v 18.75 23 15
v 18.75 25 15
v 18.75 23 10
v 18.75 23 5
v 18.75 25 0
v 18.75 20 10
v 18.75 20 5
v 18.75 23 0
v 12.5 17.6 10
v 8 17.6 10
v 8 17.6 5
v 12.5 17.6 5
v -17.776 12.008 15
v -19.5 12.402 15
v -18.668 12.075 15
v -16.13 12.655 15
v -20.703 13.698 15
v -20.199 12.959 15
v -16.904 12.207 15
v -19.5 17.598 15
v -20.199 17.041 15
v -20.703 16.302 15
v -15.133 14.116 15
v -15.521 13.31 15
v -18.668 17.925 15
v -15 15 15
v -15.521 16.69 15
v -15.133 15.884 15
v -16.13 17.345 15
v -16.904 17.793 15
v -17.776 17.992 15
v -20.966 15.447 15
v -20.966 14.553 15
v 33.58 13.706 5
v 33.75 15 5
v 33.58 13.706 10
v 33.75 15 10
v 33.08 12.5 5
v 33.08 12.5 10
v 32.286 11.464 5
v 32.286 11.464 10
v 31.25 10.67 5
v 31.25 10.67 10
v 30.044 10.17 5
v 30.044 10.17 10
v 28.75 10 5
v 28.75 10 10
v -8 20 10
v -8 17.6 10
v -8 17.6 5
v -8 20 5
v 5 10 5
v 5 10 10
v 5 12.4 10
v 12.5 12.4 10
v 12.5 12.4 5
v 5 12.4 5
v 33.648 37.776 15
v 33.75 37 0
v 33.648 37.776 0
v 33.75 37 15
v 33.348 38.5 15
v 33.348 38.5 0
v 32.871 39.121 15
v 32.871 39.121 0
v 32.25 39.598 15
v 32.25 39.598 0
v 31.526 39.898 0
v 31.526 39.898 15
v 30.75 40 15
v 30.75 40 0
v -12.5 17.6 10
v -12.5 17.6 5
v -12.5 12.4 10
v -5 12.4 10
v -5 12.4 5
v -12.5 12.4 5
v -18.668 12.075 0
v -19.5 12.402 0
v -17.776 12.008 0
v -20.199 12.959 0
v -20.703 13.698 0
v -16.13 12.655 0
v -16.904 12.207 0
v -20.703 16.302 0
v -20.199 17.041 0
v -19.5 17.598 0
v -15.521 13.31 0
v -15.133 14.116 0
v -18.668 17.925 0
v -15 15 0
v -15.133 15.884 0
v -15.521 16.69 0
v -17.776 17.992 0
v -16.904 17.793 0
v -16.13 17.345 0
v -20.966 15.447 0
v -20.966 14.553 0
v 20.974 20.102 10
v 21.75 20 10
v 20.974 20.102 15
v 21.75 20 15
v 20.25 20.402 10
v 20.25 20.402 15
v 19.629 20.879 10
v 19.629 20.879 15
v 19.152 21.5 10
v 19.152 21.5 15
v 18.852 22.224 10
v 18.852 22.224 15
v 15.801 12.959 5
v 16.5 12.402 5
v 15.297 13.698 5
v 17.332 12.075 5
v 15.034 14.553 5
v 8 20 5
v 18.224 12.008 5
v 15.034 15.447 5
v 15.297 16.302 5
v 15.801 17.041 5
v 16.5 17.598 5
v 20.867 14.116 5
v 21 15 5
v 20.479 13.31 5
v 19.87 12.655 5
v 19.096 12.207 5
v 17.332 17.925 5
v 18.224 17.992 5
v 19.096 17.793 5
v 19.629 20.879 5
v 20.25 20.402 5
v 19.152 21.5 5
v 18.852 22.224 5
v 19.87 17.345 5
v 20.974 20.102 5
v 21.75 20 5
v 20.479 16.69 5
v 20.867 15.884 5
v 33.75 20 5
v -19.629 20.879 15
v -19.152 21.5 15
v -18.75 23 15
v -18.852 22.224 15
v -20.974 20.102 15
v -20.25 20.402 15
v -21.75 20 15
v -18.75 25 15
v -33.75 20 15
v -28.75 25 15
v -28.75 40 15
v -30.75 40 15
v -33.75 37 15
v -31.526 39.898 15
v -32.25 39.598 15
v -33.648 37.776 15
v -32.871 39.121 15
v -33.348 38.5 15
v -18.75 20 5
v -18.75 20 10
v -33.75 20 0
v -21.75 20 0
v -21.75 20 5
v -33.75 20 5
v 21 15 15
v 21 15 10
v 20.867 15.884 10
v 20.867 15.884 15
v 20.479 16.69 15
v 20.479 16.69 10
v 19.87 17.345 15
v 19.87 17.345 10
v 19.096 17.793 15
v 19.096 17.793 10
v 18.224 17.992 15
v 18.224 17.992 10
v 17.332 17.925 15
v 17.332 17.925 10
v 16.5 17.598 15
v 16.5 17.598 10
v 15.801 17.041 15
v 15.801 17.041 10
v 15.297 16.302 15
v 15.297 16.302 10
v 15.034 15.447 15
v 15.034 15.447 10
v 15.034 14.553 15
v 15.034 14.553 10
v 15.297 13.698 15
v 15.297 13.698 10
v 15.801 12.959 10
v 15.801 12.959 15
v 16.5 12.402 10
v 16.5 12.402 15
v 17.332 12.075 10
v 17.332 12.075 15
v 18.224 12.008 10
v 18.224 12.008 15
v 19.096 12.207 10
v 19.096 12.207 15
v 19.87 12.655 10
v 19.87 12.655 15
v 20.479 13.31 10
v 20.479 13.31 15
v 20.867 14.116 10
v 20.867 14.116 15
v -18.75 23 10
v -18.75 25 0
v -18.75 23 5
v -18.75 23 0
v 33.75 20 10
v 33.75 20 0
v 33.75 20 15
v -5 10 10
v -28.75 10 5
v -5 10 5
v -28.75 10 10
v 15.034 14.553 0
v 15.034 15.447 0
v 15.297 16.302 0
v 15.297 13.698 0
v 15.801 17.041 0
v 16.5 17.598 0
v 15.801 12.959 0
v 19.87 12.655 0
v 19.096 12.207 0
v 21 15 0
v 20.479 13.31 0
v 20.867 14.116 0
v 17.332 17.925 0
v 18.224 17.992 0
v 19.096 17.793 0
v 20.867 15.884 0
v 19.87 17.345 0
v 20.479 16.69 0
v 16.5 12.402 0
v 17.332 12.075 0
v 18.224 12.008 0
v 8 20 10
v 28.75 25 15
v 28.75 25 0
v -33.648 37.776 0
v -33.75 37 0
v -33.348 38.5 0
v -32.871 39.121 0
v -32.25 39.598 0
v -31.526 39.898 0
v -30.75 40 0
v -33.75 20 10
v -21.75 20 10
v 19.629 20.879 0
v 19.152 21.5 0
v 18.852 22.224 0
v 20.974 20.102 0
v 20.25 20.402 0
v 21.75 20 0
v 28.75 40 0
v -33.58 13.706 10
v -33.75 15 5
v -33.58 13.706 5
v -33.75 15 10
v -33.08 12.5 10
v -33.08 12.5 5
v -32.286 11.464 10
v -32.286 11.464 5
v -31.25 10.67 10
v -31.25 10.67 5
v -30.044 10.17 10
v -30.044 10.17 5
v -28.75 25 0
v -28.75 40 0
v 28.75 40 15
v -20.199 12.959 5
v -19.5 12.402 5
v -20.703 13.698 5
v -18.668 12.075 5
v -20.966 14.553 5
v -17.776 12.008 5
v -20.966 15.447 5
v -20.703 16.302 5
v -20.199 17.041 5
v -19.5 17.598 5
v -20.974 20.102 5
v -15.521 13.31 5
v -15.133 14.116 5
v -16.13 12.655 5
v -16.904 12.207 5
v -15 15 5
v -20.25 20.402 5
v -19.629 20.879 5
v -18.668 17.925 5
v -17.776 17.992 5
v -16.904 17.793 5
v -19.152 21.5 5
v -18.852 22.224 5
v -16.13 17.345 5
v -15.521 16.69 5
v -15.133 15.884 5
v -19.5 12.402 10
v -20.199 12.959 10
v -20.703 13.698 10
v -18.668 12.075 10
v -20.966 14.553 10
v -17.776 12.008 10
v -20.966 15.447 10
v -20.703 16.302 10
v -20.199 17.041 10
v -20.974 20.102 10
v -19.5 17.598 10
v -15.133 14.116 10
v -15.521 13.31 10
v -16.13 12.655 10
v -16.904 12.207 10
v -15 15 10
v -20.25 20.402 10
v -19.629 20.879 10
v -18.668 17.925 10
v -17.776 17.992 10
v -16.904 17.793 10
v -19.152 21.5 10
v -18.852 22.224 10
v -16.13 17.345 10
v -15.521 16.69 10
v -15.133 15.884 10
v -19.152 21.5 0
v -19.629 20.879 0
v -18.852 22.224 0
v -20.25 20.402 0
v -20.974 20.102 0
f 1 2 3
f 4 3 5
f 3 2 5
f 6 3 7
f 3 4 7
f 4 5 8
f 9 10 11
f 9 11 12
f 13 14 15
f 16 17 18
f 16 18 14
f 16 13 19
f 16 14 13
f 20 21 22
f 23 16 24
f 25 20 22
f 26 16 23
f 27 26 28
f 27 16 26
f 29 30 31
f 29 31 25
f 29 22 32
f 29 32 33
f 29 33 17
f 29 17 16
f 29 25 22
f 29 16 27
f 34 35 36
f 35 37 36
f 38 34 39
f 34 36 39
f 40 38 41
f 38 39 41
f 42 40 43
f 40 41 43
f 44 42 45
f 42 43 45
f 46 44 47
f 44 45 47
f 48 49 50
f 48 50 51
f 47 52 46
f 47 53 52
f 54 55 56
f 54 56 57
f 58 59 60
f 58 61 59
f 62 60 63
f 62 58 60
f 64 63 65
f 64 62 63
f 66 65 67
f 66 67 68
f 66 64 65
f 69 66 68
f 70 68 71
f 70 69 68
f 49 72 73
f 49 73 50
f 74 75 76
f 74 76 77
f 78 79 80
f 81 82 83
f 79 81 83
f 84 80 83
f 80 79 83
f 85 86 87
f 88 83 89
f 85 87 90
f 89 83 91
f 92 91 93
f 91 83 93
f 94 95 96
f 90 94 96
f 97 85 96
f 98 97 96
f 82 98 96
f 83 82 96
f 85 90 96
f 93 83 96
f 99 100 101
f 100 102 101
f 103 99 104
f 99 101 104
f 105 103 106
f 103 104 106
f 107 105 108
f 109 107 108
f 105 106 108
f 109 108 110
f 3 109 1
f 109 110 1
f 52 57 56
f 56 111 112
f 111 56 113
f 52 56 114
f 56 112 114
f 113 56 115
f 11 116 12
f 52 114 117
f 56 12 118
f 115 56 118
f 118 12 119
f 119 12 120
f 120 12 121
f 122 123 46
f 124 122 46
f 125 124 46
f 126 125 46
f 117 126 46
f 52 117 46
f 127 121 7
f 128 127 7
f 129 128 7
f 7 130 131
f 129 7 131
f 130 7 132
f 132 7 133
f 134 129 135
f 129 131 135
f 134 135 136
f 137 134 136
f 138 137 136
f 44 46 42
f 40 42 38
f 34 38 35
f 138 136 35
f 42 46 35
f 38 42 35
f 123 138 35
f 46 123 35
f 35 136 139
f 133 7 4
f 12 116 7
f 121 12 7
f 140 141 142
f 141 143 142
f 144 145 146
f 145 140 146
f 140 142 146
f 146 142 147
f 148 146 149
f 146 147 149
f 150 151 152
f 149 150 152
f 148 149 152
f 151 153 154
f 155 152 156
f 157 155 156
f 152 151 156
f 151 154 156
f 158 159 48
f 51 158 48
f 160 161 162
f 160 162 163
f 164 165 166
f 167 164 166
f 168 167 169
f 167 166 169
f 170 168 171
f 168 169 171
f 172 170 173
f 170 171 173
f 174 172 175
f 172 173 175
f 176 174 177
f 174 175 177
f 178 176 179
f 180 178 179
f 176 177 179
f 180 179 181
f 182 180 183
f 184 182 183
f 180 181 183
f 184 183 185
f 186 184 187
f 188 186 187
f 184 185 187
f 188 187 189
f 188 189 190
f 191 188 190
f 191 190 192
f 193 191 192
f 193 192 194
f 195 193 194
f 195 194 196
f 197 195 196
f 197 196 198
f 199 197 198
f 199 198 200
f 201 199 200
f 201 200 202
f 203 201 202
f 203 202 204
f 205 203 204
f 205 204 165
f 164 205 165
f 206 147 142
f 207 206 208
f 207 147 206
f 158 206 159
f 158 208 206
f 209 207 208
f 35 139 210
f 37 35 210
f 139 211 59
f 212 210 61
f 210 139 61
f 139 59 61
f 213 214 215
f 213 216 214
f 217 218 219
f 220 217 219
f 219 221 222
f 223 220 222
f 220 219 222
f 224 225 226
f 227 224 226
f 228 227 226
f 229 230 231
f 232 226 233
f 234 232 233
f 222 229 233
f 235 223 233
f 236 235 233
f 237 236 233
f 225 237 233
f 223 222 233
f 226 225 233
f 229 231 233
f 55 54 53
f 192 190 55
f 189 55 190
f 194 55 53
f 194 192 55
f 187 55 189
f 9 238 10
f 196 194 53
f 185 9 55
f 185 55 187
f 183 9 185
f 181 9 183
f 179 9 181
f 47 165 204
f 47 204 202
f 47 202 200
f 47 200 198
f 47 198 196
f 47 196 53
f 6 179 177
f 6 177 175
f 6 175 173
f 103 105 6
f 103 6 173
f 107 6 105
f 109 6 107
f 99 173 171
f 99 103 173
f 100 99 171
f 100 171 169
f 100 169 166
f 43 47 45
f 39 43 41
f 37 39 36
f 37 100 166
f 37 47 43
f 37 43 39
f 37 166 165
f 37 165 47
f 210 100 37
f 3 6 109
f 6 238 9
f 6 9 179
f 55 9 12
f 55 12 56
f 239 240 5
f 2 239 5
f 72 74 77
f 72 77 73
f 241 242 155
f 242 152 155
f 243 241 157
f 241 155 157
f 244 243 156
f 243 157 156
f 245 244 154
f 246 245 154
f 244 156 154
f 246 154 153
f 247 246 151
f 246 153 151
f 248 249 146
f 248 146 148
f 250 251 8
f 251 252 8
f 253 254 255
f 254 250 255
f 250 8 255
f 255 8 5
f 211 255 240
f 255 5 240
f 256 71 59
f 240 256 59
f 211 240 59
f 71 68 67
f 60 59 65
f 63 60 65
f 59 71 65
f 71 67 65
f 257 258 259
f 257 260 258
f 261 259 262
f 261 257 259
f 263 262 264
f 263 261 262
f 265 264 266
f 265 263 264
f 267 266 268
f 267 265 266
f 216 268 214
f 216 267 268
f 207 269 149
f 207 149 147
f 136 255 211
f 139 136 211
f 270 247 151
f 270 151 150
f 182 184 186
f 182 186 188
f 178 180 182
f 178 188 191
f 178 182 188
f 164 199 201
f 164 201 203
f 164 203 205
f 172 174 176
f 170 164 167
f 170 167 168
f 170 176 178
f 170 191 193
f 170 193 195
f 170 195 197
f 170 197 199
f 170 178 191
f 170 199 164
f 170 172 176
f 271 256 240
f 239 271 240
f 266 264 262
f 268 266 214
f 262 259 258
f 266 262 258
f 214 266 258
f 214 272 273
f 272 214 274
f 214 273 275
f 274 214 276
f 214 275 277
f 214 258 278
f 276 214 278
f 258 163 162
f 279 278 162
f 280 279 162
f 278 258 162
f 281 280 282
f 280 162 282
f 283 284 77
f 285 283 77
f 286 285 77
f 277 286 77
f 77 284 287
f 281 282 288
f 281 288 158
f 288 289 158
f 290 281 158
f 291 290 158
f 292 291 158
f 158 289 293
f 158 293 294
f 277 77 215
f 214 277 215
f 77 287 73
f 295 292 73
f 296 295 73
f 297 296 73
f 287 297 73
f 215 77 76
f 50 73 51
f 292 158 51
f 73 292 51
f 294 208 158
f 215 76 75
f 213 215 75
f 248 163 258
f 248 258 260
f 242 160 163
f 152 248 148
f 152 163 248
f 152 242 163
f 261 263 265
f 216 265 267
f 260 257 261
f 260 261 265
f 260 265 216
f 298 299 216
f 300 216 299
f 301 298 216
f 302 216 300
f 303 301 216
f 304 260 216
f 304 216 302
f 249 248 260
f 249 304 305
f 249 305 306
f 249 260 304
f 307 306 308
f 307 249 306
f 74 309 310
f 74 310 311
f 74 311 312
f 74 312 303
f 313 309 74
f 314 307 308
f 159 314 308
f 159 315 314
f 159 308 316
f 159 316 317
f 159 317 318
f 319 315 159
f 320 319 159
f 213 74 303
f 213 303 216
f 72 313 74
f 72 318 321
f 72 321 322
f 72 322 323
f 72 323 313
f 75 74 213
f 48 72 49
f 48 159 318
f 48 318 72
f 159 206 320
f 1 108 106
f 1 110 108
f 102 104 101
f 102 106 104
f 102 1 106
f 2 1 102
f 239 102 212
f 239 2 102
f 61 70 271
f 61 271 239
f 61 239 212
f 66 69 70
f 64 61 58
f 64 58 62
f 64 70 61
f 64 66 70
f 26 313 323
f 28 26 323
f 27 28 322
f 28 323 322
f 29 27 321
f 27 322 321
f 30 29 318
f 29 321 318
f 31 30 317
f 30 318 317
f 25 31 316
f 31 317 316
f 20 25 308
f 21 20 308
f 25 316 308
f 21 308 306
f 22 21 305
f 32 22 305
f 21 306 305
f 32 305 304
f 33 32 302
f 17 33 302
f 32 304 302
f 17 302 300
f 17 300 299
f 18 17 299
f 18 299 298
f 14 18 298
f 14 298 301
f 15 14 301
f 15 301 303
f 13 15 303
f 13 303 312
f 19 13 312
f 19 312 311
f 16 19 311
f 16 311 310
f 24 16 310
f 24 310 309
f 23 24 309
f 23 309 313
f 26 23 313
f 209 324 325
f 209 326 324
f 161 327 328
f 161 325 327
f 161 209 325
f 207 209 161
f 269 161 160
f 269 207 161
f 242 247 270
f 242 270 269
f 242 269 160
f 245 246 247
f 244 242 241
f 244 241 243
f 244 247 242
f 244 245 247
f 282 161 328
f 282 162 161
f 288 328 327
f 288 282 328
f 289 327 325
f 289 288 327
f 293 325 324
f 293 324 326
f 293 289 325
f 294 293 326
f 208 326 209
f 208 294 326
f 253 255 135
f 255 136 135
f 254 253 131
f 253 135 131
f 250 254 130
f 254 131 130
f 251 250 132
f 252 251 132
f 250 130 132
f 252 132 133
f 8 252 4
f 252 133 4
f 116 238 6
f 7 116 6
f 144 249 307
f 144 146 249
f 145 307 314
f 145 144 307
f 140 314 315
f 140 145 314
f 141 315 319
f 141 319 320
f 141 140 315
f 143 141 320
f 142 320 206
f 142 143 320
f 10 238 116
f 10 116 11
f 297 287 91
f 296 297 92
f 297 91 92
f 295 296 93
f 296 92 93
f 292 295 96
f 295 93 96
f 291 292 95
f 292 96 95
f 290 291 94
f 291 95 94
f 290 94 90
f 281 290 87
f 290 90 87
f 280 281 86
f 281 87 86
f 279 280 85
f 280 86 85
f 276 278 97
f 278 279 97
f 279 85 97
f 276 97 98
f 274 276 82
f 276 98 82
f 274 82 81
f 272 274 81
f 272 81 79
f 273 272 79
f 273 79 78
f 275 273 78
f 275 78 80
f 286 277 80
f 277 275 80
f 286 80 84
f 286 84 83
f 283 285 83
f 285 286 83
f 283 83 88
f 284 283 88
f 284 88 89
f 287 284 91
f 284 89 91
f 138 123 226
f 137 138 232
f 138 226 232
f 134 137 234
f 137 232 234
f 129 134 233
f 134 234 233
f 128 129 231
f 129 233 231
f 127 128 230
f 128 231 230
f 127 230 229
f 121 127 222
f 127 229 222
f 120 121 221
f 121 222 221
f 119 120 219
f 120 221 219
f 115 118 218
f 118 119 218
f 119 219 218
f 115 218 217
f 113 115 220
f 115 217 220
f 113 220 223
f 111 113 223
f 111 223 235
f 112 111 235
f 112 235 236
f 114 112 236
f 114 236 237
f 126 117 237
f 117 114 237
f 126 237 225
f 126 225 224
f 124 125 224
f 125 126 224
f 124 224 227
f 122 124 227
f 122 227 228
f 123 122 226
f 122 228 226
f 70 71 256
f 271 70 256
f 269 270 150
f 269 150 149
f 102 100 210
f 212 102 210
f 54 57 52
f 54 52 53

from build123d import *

# Parameters (mm, degrees)
CYLINDER001_R     = 3
CYLINDER001_DEPTH = 15
PAD_DEPTH         = 15
SKETCH002_W       = 28.75
SKETCH002_H       = 5
PAD002_DEPTH      = 10
POCKET_DEPTH      = 10.001
FILLET_R          = 3
FILLET002_R       = 3
PAD001_DEPTH      = 15
SKETCH003_W       = 28.75
SKETCH003_H       = 5
PAD003_DEPTH      = 10
POCKET001_DEPTH   = 10.001
FILLET001_R       = 3
FILLET003_R       = 3
CYLINDER_R        = 3
CYLINDER_DEPTH    = 15
FILLET004_R       = 5


with BuildPart() as cylinder001:
    # Cylinder001 → Cylinder001 (new body)
    with BuildSketch(Plane(origin=(18, 15, 0), x_dir=(1, 0, 0), z_dir=(0, 0, 1))):
        Circle(CYLINDER001_R)
    extrude(amount=CYLINDER001_DEPTH)


with BuildPart() as fillet002:
    # Sketch → Pad (new body)
    with BuildSketch(Plane.XY):
        Polygon((-28.75, 40), (-28.75, 25), (-18.75, 25), (-18.75, 20), (-33.75, 20), (-33.75, 40), align=None)
    extrude(amount=PAD_DEPTH)

    # Sketch002 → Pad002 (new body)
    with BuildSketch(Plane.XZ.offset(-20)):
        with Locations((-19.375, 7.5)):
            Rectangle(SKETCH002_W, SKETCH002_H)
    extrude(amount=PAD002_DEPTH)

    # Sketch004 → Pocket (cut, through all)
    with BuildSketch(Plane.XY.offset(10)):
        Polygon((12.5, 17.6), (12.5, 12.4), (-12.5, 12.4), (-12.5, 17.6), (-8, 17.6), (-8, 21.6), (8, 21.6), (8, 17.6), align=None)
    extrude(amount=-POCKET_DEPTH, mode=Mode.SUBTRACT)

    # Fillet
    fillet_edges = [fillet002.edges().sort_by_distance(p)[0] for p in [
        (-18.75, 20, 12.5),
        (-18.75, 20, 2.5),
    ]]
    fillet(fillet_edges, radius=FILLET_R)

    # Fillet002
    fillet002_edges = [fillet002.edges().sort_by_distance(p)[0] for p in [
        (-33.75, 40, 7.5),
    ]]
    fillet(fillet002_edges, radius=FILLET002_R)


with BuildPart() as fillet003:
    # Sketch001 → Pad001 (new body)
    with BuildSketch(Plane.XY):
        Polygon((18.75, 25), (18.75, 20), (33.75, 20), (33.75, 40), (28.75, 40), (28.75, 25), align=None)
    extrude(amount=PAD001_DEPTH)

    # Sketch003 → Pad003 (new body)
    with BuildSketch(Plane.XZ.offset(-20)):
        with Locations((19.375, 7.5)):
            Rectangle(SKETCH003_W, SKETCH003_H)
    extrude(amount=PAD003_DEPTH)

    # Sketch005 → Pocket001 (cut, through all)
    with BuildSketch(Plane.XY.offset(10)):
        Polygon((12.5, 17.6), (12.5, 12.4), (-12.5, 12.4), (-12.5, 17.6), (-8, 17.6), (-8, 21.6), (8, 21.6), (8, 17.6), align=None)
    extrude(amount=-POCKET001_DEPTH, mode=Mode.SUBTRACT)

    # Fillet001
    fillet001_edges = [fillet003.edges().sort_by_distance(p)[0] for p in [
        (18.75, 20, 2.5),
        (18.75, 20, 12.5),
    ]]
    fillet(fillet001_edges, radius=FILLET001_R)

    # Fillet003
    fillet003_edges = [fillet003.edges().sort_by_distance(p)[0] for p in [
        (33.75, 40, 7.5),
    ]]
    fillet(fillet003_edges, radius=FILLET003_R)


with BuildPart() as claws:
    # Cylinder → Cylinder (new body)
    with BuildSketch(Plane(origin=(-18, 15, 0), x_dir=(1, 0, 0), z_dir=(0, 0, 1))):
        Circle(CYLINDER_R)
    extrude(amount=CYLINDER_DEPTH)

    # Fusion: union Cylinder001, Fillet002, Fillet003
    add(cylinder001.part)
    add(fillet002.part)
    add(fillet003.part)

    # Fillet004
    fillet004_edges = [claws.edges().sort_by_distance(p)[0] for p in [
        (33.75, 10, 7.5),
        (-33.75, 10, 7.5),
    ]]
    fillet(fillet004_edges, radius=FILLET004_R)


solid = claws.part
